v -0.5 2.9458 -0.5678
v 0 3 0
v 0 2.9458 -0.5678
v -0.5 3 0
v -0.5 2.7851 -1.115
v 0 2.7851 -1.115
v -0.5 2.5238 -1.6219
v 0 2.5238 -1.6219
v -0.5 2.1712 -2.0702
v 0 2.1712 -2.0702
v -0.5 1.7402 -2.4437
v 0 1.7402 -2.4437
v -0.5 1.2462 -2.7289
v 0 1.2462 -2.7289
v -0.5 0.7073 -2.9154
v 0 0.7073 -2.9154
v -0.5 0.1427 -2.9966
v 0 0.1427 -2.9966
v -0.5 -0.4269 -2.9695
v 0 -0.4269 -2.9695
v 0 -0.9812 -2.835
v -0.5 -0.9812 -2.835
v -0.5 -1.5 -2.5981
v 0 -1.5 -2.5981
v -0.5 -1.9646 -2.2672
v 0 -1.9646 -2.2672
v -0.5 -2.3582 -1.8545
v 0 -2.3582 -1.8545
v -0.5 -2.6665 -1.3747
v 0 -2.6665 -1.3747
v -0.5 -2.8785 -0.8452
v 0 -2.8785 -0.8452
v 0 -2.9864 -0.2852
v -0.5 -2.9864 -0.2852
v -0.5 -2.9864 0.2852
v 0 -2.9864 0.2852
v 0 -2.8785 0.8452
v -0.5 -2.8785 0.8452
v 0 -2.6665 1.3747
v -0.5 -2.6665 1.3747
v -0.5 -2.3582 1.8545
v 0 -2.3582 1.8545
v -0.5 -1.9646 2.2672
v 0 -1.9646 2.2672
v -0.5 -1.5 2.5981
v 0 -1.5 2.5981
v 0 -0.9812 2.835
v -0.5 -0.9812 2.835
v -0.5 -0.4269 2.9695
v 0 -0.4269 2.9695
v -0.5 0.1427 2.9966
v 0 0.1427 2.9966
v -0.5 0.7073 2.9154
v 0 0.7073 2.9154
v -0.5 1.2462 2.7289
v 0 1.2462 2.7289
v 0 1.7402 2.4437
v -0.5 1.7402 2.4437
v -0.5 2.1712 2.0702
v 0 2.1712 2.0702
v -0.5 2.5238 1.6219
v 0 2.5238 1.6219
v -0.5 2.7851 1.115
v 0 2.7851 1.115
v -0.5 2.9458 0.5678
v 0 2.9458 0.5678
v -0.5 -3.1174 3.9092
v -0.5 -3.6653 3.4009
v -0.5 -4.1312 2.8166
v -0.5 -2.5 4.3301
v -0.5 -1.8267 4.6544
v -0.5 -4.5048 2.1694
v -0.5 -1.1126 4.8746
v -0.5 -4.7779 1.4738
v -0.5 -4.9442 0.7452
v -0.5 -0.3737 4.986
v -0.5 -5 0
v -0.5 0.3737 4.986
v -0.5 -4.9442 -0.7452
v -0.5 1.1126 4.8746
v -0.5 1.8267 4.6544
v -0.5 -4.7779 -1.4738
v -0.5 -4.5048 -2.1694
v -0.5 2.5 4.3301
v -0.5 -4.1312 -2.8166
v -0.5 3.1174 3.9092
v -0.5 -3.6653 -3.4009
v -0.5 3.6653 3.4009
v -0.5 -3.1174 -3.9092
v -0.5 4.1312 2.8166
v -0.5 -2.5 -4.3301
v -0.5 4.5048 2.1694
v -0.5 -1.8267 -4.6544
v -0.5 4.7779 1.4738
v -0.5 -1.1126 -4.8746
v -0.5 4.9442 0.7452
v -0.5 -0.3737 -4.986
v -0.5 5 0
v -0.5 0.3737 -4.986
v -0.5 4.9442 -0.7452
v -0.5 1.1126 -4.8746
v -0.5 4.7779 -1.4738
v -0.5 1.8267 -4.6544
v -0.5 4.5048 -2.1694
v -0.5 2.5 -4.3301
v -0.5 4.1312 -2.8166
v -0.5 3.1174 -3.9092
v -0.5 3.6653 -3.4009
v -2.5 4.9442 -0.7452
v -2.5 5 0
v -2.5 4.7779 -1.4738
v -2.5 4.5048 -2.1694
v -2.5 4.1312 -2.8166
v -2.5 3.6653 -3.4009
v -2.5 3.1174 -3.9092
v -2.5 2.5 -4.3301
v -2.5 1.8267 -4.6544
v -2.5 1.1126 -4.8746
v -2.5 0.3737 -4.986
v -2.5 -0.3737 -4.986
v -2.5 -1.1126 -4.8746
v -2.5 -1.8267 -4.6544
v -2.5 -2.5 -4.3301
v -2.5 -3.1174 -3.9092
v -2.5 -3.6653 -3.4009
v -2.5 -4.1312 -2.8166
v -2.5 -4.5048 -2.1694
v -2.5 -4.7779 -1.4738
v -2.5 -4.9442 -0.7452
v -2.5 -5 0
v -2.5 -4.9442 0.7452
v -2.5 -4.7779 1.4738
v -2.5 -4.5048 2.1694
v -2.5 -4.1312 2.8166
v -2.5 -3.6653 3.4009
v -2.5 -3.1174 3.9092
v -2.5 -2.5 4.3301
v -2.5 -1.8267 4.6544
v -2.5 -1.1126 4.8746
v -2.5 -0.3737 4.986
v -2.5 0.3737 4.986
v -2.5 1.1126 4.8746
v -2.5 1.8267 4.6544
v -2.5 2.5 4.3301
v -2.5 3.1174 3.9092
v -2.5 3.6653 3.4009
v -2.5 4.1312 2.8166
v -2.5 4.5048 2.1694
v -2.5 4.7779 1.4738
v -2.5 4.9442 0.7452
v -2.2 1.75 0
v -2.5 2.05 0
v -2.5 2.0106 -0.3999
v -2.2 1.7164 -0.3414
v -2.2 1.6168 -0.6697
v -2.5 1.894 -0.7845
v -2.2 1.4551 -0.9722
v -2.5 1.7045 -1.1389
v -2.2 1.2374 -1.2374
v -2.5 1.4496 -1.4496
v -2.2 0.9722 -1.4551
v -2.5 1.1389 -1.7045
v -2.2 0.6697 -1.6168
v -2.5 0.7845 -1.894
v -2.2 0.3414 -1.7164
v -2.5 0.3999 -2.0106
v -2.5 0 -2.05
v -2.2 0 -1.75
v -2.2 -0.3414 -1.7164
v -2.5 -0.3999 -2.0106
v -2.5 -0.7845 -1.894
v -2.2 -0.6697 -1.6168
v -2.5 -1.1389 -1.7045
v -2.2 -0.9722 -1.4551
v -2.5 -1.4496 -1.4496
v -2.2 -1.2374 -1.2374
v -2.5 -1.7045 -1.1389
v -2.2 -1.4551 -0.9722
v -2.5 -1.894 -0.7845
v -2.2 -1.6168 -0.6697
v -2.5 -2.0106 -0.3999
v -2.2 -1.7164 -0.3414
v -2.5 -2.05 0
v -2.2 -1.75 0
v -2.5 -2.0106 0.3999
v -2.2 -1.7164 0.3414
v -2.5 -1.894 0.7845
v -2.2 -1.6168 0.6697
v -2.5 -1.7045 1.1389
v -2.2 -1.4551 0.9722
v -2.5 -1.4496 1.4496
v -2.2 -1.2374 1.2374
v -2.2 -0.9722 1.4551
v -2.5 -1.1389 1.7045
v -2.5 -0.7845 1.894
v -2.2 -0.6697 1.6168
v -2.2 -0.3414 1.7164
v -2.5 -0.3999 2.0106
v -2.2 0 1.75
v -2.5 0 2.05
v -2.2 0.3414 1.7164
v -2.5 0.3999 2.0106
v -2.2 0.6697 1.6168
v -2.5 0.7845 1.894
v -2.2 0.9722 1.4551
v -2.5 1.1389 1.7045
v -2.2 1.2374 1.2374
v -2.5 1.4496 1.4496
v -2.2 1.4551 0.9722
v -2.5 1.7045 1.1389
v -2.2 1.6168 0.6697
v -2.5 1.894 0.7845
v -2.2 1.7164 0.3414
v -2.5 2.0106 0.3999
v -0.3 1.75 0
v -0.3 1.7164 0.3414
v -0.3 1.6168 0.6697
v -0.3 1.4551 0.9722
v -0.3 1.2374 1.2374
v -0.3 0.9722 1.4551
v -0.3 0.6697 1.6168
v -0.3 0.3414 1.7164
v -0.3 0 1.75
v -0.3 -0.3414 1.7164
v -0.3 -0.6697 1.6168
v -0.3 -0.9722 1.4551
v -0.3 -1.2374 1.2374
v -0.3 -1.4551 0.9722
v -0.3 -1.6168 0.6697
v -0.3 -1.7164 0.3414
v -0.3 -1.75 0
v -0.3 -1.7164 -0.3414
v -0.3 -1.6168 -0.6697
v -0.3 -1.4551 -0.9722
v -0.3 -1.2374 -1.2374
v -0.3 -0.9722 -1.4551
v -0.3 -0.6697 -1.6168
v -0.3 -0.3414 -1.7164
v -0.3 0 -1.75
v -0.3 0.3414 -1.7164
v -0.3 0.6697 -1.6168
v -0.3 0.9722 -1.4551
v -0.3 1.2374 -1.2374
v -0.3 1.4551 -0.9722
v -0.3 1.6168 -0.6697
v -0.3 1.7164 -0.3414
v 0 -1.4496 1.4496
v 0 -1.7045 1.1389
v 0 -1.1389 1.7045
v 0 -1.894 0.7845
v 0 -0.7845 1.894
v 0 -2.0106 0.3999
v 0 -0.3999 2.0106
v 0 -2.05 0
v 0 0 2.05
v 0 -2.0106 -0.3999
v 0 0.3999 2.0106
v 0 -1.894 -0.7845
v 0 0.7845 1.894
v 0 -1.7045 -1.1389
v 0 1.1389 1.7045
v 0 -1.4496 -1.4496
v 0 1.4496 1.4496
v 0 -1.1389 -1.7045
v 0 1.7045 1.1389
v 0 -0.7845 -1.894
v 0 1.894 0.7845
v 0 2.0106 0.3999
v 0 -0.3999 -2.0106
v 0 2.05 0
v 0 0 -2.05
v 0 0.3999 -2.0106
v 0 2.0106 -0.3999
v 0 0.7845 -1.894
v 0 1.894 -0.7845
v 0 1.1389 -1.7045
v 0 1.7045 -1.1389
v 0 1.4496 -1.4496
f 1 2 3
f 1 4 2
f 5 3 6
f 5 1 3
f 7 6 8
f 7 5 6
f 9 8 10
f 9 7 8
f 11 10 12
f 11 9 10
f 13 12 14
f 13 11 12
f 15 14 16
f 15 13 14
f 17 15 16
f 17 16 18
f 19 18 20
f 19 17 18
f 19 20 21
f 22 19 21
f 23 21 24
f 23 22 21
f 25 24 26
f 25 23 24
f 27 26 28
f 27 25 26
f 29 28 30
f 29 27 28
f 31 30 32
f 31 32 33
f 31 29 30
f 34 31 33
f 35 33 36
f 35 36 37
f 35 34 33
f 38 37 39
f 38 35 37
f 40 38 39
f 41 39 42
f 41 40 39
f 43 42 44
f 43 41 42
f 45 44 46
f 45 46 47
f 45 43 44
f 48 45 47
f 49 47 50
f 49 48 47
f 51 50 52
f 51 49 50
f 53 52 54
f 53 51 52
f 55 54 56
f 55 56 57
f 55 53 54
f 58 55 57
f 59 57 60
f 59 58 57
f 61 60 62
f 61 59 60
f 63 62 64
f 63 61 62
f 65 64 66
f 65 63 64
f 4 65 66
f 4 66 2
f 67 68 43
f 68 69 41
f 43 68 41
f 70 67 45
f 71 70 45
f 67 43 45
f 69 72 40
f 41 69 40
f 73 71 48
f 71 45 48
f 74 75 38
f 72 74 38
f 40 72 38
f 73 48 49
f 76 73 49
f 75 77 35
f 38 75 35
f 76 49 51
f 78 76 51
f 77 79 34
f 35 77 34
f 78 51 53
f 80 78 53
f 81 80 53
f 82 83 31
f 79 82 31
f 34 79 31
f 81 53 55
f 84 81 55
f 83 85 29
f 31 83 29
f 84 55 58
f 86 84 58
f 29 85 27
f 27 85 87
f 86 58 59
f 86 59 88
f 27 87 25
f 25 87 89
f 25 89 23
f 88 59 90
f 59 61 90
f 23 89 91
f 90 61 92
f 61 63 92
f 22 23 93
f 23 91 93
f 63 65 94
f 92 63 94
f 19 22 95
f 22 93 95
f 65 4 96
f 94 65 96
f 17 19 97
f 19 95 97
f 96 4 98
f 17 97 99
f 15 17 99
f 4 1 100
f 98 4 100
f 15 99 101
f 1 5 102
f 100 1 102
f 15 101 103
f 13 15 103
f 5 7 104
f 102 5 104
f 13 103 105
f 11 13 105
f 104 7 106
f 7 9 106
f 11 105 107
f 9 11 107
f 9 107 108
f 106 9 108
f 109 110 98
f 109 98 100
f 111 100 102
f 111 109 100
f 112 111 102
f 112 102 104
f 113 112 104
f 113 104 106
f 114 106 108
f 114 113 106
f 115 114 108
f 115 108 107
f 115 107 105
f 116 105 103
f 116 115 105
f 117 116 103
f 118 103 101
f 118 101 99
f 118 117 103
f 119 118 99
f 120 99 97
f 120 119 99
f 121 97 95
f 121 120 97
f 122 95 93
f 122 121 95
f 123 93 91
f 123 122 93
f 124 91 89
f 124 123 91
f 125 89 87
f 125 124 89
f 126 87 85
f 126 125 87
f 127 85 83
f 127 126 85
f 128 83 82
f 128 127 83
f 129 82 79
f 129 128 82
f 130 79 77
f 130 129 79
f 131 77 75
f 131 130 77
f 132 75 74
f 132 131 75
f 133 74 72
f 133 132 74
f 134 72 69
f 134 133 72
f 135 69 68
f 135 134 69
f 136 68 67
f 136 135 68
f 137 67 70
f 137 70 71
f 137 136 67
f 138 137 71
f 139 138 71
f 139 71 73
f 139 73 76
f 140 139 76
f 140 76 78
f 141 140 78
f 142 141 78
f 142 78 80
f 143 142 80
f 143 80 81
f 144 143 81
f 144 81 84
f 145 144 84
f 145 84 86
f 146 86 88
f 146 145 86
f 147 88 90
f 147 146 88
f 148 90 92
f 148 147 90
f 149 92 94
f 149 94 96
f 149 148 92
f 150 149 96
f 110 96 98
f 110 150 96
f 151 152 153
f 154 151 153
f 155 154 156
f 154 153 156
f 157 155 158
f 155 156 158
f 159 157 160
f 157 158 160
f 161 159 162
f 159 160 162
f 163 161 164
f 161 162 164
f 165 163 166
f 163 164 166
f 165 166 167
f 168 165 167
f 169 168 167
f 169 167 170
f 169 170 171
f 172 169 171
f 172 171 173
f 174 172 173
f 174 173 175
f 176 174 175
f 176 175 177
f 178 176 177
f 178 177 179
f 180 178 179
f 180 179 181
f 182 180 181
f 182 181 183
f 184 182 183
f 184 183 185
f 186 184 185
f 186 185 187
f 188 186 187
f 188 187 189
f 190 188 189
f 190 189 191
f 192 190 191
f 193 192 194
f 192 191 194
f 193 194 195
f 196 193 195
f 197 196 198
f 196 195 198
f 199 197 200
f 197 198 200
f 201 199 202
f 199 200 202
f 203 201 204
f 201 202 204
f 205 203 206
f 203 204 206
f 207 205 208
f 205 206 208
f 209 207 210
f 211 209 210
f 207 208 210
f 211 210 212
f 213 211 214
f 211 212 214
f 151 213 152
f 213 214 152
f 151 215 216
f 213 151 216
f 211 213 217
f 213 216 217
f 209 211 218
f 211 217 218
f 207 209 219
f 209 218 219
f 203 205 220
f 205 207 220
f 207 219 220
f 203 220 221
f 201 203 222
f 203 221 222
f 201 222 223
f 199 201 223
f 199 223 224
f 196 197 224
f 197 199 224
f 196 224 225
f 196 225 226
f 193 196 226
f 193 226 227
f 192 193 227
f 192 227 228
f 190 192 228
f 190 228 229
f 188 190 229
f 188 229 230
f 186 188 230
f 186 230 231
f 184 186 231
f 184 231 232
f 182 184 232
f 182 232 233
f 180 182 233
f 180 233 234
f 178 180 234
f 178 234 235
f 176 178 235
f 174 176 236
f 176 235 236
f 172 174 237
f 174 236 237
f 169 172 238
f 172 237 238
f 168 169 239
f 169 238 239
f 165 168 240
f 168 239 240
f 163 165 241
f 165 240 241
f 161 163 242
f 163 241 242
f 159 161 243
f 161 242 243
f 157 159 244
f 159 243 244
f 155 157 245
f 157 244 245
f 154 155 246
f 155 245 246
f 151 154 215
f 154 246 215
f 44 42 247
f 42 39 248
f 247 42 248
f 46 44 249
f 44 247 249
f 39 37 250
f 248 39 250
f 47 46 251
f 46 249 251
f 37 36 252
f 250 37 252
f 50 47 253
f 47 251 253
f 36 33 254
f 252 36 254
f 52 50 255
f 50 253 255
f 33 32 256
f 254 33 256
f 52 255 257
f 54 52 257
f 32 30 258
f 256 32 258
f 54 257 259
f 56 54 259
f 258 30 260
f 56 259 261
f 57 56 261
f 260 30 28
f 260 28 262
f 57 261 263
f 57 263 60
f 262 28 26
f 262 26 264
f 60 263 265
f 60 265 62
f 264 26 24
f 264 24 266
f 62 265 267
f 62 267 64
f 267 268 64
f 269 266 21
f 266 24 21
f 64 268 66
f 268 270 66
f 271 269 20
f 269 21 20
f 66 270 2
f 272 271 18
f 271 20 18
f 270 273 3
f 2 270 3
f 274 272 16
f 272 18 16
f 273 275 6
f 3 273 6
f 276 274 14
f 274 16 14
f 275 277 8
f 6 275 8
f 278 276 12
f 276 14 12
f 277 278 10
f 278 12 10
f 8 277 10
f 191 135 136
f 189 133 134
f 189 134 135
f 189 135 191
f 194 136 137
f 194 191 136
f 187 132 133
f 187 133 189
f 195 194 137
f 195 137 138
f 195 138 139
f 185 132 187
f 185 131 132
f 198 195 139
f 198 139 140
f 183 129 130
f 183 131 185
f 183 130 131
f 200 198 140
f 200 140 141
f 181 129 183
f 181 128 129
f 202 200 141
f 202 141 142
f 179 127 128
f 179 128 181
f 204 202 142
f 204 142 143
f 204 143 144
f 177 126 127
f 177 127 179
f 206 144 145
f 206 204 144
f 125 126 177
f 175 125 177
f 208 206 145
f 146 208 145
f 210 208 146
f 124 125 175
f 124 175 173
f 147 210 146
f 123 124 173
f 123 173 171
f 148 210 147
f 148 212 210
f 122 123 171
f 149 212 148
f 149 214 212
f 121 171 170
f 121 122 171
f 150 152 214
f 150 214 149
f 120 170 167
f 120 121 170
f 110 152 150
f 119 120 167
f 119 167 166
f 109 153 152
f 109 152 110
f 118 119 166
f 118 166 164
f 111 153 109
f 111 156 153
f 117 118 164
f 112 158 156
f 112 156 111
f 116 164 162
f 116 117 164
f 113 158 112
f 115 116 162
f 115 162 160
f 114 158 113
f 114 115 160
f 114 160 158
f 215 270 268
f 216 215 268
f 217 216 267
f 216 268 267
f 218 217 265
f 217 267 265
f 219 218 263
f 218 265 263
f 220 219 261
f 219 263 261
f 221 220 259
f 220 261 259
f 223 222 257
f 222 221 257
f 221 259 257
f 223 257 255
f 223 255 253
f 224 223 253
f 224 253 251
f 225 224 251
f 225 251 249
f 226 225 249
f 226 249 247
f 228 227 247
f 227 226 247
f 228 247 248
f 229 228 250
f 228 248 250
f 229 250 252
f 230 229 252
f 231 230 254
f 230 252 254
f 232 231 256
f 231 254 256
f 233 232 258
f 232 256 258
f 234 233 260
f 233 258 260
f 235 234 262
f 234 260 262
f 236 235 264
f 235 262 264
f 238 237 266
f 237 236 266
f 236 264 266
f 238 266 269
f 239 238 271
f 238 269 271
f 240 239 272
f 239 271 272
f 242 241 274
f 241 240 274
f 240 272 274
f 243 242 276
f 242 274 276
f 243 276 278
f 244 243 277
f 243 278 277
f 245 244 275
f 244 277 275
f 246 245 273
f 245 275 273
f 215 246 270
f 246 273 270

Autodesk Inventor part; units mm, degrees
ref_plane "YZ Plane" through (0, 0, 0) normal (1, 0, 0) x (0, 1, 0)
ref_plane "XZ Plane" through (0, 0, 0) normal (0, 1, 0) x (-1, 0, 0)
ref_plane "XY Plane" through (0, 0, 0) normal (0, 0, 1) x (1, 0, 0)
sketch "Эскиз1" plane through (0, 0, 0) normal (0, 0, 1) x (1, 0, 0)
  line L0 (0, 1.75) -> (0, 3)
  line L1 (0, 3) -> (-0.5, 3)
  line L2 (-0.5, 3) -> (-0.5, 5)
  line L3 (-0.5, 5) -> (-2.5, 5)
  line L4 (-2.5, 5) -> (-2.5, 1.75)
  line L5 (-2.5, 1.75) -> (0, 1.75)
  line L6 (0, 0) -> (-4.5246, 0) construction
  dimension "d0" = 6
  dimension "d1" = 10
  dimension "d2" = 3.5
  dimension "d3" = 0.5
  dimension "d12" = 2
revolve "Вращение1" add sketch "Эскиз1" angle 360 about axis through (0, 0, 0) along (-1, 0, 0)
chamfer "Фаска1" distance 0.3 angle 45 2 edges at (-2.5, -1.75, 0) (0, -1.75, 0)
properties part number "Стопорная шайба"
